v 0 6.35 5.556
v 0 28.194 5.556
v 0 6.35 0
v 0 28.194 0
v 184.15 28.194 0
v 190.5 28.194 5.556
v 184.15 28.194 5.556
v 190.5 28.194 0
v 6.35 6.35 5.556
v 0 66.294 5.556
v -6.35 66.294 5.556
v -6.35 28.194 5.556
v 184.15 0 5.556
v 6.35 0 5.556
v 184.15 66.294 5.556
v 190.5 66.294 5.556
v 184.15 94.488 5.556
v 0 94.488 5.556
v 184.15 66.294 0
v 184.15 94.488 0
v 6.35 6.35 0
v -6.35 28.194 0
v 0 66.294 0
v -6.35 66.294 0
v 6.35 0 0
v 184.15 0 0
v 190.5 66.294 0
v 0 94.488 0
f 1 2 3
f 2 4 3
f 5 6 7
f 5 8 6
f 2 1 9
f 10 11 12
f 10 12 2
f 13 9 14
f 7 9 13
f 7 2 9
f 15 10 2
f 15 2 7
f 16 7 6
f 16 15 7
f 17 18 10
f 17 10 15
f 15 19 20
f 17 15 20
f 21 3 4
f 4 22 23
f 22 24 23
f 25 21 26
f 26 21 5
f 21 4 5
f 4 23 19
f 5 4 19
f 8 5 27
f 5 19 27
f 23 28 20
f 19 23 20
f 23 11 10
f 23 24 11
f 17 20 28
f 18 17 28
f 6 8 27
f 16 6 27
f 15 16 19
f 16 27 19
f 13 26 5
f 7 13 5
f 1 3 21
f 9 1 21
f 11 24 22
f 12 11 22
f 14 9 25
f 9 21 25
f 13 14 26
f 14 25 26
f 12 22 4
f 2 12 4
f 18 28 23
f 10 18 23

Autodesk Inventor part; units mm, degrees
ref_plane "YZ Plane" through (0, 0, 0) normal (1, 0, 0) x (0, 1, 0)
ref_plane "XZ Plane" through (0, 0, 0) normal (0, 1, 0) x (-1, 0, 0)
ref_plane "XY Plane" through (0, 0, 0) normal (0, 0, 1) x (1, 0, 0)
sketch "Sketch1" plane through (0, 0, 0) normal (0, 0, 1) x (1, 0, 0)
  line L0 (0, 0) -> (184.15, 0)
  line L1 (184.15, 94.488) -> (0, 94.488)
  line L2 (190.5, 47.244) -> (190.5, 66.294)
  line L3 (190.5, 66.294) -> (184.15, 66.294)
  line L4 (190.5, 47.244) -> (190.5, 28.194)
  line L5 (190.5, 28.194) -> (184.15, 28.194)
  line L6 (-6.35, 47.244) -> (-6.35, 66.294)
  line L7 (-6.35, 66.294) -> (0, 66.294)
  line L8 (-6.35, 47.244) -> (-6.35, 28.194)
  line L9 (-6.35, 28.194) -> (0, 28.194)
  line L10 (0, 94.488) -> (0, 66.294)
  line L11 (0, 28.194) -> (0, 0)
  line L12 (184.15, 0) -> (184.15, 28.194)
  line L13 (184.15, 66.294) -> (184.15, 94.488)
  dimension "d0" = 184.15
extrude "Extrusion1" add sketch "Sketch1" along normal blind 5.5563
sketch "Sketch2" plane through (0, 0, 0) normal (0, 0, -1) x (-1, 0, 0)
  line L0 (0, 0) -> (0, 6.35)
  line L1 (0, 28.194) -> (0, 0) projected
  line L2 (0, 6.35) -> (-6.35, 6.35)
  line L3 (-6.35, 6.35) -> (-6.35, 0)
  line L4 (0, 6.35) -> (0, 0)
  line L5 (0, 0) -> (-184.15, 0) projected
  line L6 (-6.35, 0) -> (0, 0)
extrude "Extrusion2" cut sketch "Sketch2" against normal blind 6.35
properties part number "lower_front_wall"
